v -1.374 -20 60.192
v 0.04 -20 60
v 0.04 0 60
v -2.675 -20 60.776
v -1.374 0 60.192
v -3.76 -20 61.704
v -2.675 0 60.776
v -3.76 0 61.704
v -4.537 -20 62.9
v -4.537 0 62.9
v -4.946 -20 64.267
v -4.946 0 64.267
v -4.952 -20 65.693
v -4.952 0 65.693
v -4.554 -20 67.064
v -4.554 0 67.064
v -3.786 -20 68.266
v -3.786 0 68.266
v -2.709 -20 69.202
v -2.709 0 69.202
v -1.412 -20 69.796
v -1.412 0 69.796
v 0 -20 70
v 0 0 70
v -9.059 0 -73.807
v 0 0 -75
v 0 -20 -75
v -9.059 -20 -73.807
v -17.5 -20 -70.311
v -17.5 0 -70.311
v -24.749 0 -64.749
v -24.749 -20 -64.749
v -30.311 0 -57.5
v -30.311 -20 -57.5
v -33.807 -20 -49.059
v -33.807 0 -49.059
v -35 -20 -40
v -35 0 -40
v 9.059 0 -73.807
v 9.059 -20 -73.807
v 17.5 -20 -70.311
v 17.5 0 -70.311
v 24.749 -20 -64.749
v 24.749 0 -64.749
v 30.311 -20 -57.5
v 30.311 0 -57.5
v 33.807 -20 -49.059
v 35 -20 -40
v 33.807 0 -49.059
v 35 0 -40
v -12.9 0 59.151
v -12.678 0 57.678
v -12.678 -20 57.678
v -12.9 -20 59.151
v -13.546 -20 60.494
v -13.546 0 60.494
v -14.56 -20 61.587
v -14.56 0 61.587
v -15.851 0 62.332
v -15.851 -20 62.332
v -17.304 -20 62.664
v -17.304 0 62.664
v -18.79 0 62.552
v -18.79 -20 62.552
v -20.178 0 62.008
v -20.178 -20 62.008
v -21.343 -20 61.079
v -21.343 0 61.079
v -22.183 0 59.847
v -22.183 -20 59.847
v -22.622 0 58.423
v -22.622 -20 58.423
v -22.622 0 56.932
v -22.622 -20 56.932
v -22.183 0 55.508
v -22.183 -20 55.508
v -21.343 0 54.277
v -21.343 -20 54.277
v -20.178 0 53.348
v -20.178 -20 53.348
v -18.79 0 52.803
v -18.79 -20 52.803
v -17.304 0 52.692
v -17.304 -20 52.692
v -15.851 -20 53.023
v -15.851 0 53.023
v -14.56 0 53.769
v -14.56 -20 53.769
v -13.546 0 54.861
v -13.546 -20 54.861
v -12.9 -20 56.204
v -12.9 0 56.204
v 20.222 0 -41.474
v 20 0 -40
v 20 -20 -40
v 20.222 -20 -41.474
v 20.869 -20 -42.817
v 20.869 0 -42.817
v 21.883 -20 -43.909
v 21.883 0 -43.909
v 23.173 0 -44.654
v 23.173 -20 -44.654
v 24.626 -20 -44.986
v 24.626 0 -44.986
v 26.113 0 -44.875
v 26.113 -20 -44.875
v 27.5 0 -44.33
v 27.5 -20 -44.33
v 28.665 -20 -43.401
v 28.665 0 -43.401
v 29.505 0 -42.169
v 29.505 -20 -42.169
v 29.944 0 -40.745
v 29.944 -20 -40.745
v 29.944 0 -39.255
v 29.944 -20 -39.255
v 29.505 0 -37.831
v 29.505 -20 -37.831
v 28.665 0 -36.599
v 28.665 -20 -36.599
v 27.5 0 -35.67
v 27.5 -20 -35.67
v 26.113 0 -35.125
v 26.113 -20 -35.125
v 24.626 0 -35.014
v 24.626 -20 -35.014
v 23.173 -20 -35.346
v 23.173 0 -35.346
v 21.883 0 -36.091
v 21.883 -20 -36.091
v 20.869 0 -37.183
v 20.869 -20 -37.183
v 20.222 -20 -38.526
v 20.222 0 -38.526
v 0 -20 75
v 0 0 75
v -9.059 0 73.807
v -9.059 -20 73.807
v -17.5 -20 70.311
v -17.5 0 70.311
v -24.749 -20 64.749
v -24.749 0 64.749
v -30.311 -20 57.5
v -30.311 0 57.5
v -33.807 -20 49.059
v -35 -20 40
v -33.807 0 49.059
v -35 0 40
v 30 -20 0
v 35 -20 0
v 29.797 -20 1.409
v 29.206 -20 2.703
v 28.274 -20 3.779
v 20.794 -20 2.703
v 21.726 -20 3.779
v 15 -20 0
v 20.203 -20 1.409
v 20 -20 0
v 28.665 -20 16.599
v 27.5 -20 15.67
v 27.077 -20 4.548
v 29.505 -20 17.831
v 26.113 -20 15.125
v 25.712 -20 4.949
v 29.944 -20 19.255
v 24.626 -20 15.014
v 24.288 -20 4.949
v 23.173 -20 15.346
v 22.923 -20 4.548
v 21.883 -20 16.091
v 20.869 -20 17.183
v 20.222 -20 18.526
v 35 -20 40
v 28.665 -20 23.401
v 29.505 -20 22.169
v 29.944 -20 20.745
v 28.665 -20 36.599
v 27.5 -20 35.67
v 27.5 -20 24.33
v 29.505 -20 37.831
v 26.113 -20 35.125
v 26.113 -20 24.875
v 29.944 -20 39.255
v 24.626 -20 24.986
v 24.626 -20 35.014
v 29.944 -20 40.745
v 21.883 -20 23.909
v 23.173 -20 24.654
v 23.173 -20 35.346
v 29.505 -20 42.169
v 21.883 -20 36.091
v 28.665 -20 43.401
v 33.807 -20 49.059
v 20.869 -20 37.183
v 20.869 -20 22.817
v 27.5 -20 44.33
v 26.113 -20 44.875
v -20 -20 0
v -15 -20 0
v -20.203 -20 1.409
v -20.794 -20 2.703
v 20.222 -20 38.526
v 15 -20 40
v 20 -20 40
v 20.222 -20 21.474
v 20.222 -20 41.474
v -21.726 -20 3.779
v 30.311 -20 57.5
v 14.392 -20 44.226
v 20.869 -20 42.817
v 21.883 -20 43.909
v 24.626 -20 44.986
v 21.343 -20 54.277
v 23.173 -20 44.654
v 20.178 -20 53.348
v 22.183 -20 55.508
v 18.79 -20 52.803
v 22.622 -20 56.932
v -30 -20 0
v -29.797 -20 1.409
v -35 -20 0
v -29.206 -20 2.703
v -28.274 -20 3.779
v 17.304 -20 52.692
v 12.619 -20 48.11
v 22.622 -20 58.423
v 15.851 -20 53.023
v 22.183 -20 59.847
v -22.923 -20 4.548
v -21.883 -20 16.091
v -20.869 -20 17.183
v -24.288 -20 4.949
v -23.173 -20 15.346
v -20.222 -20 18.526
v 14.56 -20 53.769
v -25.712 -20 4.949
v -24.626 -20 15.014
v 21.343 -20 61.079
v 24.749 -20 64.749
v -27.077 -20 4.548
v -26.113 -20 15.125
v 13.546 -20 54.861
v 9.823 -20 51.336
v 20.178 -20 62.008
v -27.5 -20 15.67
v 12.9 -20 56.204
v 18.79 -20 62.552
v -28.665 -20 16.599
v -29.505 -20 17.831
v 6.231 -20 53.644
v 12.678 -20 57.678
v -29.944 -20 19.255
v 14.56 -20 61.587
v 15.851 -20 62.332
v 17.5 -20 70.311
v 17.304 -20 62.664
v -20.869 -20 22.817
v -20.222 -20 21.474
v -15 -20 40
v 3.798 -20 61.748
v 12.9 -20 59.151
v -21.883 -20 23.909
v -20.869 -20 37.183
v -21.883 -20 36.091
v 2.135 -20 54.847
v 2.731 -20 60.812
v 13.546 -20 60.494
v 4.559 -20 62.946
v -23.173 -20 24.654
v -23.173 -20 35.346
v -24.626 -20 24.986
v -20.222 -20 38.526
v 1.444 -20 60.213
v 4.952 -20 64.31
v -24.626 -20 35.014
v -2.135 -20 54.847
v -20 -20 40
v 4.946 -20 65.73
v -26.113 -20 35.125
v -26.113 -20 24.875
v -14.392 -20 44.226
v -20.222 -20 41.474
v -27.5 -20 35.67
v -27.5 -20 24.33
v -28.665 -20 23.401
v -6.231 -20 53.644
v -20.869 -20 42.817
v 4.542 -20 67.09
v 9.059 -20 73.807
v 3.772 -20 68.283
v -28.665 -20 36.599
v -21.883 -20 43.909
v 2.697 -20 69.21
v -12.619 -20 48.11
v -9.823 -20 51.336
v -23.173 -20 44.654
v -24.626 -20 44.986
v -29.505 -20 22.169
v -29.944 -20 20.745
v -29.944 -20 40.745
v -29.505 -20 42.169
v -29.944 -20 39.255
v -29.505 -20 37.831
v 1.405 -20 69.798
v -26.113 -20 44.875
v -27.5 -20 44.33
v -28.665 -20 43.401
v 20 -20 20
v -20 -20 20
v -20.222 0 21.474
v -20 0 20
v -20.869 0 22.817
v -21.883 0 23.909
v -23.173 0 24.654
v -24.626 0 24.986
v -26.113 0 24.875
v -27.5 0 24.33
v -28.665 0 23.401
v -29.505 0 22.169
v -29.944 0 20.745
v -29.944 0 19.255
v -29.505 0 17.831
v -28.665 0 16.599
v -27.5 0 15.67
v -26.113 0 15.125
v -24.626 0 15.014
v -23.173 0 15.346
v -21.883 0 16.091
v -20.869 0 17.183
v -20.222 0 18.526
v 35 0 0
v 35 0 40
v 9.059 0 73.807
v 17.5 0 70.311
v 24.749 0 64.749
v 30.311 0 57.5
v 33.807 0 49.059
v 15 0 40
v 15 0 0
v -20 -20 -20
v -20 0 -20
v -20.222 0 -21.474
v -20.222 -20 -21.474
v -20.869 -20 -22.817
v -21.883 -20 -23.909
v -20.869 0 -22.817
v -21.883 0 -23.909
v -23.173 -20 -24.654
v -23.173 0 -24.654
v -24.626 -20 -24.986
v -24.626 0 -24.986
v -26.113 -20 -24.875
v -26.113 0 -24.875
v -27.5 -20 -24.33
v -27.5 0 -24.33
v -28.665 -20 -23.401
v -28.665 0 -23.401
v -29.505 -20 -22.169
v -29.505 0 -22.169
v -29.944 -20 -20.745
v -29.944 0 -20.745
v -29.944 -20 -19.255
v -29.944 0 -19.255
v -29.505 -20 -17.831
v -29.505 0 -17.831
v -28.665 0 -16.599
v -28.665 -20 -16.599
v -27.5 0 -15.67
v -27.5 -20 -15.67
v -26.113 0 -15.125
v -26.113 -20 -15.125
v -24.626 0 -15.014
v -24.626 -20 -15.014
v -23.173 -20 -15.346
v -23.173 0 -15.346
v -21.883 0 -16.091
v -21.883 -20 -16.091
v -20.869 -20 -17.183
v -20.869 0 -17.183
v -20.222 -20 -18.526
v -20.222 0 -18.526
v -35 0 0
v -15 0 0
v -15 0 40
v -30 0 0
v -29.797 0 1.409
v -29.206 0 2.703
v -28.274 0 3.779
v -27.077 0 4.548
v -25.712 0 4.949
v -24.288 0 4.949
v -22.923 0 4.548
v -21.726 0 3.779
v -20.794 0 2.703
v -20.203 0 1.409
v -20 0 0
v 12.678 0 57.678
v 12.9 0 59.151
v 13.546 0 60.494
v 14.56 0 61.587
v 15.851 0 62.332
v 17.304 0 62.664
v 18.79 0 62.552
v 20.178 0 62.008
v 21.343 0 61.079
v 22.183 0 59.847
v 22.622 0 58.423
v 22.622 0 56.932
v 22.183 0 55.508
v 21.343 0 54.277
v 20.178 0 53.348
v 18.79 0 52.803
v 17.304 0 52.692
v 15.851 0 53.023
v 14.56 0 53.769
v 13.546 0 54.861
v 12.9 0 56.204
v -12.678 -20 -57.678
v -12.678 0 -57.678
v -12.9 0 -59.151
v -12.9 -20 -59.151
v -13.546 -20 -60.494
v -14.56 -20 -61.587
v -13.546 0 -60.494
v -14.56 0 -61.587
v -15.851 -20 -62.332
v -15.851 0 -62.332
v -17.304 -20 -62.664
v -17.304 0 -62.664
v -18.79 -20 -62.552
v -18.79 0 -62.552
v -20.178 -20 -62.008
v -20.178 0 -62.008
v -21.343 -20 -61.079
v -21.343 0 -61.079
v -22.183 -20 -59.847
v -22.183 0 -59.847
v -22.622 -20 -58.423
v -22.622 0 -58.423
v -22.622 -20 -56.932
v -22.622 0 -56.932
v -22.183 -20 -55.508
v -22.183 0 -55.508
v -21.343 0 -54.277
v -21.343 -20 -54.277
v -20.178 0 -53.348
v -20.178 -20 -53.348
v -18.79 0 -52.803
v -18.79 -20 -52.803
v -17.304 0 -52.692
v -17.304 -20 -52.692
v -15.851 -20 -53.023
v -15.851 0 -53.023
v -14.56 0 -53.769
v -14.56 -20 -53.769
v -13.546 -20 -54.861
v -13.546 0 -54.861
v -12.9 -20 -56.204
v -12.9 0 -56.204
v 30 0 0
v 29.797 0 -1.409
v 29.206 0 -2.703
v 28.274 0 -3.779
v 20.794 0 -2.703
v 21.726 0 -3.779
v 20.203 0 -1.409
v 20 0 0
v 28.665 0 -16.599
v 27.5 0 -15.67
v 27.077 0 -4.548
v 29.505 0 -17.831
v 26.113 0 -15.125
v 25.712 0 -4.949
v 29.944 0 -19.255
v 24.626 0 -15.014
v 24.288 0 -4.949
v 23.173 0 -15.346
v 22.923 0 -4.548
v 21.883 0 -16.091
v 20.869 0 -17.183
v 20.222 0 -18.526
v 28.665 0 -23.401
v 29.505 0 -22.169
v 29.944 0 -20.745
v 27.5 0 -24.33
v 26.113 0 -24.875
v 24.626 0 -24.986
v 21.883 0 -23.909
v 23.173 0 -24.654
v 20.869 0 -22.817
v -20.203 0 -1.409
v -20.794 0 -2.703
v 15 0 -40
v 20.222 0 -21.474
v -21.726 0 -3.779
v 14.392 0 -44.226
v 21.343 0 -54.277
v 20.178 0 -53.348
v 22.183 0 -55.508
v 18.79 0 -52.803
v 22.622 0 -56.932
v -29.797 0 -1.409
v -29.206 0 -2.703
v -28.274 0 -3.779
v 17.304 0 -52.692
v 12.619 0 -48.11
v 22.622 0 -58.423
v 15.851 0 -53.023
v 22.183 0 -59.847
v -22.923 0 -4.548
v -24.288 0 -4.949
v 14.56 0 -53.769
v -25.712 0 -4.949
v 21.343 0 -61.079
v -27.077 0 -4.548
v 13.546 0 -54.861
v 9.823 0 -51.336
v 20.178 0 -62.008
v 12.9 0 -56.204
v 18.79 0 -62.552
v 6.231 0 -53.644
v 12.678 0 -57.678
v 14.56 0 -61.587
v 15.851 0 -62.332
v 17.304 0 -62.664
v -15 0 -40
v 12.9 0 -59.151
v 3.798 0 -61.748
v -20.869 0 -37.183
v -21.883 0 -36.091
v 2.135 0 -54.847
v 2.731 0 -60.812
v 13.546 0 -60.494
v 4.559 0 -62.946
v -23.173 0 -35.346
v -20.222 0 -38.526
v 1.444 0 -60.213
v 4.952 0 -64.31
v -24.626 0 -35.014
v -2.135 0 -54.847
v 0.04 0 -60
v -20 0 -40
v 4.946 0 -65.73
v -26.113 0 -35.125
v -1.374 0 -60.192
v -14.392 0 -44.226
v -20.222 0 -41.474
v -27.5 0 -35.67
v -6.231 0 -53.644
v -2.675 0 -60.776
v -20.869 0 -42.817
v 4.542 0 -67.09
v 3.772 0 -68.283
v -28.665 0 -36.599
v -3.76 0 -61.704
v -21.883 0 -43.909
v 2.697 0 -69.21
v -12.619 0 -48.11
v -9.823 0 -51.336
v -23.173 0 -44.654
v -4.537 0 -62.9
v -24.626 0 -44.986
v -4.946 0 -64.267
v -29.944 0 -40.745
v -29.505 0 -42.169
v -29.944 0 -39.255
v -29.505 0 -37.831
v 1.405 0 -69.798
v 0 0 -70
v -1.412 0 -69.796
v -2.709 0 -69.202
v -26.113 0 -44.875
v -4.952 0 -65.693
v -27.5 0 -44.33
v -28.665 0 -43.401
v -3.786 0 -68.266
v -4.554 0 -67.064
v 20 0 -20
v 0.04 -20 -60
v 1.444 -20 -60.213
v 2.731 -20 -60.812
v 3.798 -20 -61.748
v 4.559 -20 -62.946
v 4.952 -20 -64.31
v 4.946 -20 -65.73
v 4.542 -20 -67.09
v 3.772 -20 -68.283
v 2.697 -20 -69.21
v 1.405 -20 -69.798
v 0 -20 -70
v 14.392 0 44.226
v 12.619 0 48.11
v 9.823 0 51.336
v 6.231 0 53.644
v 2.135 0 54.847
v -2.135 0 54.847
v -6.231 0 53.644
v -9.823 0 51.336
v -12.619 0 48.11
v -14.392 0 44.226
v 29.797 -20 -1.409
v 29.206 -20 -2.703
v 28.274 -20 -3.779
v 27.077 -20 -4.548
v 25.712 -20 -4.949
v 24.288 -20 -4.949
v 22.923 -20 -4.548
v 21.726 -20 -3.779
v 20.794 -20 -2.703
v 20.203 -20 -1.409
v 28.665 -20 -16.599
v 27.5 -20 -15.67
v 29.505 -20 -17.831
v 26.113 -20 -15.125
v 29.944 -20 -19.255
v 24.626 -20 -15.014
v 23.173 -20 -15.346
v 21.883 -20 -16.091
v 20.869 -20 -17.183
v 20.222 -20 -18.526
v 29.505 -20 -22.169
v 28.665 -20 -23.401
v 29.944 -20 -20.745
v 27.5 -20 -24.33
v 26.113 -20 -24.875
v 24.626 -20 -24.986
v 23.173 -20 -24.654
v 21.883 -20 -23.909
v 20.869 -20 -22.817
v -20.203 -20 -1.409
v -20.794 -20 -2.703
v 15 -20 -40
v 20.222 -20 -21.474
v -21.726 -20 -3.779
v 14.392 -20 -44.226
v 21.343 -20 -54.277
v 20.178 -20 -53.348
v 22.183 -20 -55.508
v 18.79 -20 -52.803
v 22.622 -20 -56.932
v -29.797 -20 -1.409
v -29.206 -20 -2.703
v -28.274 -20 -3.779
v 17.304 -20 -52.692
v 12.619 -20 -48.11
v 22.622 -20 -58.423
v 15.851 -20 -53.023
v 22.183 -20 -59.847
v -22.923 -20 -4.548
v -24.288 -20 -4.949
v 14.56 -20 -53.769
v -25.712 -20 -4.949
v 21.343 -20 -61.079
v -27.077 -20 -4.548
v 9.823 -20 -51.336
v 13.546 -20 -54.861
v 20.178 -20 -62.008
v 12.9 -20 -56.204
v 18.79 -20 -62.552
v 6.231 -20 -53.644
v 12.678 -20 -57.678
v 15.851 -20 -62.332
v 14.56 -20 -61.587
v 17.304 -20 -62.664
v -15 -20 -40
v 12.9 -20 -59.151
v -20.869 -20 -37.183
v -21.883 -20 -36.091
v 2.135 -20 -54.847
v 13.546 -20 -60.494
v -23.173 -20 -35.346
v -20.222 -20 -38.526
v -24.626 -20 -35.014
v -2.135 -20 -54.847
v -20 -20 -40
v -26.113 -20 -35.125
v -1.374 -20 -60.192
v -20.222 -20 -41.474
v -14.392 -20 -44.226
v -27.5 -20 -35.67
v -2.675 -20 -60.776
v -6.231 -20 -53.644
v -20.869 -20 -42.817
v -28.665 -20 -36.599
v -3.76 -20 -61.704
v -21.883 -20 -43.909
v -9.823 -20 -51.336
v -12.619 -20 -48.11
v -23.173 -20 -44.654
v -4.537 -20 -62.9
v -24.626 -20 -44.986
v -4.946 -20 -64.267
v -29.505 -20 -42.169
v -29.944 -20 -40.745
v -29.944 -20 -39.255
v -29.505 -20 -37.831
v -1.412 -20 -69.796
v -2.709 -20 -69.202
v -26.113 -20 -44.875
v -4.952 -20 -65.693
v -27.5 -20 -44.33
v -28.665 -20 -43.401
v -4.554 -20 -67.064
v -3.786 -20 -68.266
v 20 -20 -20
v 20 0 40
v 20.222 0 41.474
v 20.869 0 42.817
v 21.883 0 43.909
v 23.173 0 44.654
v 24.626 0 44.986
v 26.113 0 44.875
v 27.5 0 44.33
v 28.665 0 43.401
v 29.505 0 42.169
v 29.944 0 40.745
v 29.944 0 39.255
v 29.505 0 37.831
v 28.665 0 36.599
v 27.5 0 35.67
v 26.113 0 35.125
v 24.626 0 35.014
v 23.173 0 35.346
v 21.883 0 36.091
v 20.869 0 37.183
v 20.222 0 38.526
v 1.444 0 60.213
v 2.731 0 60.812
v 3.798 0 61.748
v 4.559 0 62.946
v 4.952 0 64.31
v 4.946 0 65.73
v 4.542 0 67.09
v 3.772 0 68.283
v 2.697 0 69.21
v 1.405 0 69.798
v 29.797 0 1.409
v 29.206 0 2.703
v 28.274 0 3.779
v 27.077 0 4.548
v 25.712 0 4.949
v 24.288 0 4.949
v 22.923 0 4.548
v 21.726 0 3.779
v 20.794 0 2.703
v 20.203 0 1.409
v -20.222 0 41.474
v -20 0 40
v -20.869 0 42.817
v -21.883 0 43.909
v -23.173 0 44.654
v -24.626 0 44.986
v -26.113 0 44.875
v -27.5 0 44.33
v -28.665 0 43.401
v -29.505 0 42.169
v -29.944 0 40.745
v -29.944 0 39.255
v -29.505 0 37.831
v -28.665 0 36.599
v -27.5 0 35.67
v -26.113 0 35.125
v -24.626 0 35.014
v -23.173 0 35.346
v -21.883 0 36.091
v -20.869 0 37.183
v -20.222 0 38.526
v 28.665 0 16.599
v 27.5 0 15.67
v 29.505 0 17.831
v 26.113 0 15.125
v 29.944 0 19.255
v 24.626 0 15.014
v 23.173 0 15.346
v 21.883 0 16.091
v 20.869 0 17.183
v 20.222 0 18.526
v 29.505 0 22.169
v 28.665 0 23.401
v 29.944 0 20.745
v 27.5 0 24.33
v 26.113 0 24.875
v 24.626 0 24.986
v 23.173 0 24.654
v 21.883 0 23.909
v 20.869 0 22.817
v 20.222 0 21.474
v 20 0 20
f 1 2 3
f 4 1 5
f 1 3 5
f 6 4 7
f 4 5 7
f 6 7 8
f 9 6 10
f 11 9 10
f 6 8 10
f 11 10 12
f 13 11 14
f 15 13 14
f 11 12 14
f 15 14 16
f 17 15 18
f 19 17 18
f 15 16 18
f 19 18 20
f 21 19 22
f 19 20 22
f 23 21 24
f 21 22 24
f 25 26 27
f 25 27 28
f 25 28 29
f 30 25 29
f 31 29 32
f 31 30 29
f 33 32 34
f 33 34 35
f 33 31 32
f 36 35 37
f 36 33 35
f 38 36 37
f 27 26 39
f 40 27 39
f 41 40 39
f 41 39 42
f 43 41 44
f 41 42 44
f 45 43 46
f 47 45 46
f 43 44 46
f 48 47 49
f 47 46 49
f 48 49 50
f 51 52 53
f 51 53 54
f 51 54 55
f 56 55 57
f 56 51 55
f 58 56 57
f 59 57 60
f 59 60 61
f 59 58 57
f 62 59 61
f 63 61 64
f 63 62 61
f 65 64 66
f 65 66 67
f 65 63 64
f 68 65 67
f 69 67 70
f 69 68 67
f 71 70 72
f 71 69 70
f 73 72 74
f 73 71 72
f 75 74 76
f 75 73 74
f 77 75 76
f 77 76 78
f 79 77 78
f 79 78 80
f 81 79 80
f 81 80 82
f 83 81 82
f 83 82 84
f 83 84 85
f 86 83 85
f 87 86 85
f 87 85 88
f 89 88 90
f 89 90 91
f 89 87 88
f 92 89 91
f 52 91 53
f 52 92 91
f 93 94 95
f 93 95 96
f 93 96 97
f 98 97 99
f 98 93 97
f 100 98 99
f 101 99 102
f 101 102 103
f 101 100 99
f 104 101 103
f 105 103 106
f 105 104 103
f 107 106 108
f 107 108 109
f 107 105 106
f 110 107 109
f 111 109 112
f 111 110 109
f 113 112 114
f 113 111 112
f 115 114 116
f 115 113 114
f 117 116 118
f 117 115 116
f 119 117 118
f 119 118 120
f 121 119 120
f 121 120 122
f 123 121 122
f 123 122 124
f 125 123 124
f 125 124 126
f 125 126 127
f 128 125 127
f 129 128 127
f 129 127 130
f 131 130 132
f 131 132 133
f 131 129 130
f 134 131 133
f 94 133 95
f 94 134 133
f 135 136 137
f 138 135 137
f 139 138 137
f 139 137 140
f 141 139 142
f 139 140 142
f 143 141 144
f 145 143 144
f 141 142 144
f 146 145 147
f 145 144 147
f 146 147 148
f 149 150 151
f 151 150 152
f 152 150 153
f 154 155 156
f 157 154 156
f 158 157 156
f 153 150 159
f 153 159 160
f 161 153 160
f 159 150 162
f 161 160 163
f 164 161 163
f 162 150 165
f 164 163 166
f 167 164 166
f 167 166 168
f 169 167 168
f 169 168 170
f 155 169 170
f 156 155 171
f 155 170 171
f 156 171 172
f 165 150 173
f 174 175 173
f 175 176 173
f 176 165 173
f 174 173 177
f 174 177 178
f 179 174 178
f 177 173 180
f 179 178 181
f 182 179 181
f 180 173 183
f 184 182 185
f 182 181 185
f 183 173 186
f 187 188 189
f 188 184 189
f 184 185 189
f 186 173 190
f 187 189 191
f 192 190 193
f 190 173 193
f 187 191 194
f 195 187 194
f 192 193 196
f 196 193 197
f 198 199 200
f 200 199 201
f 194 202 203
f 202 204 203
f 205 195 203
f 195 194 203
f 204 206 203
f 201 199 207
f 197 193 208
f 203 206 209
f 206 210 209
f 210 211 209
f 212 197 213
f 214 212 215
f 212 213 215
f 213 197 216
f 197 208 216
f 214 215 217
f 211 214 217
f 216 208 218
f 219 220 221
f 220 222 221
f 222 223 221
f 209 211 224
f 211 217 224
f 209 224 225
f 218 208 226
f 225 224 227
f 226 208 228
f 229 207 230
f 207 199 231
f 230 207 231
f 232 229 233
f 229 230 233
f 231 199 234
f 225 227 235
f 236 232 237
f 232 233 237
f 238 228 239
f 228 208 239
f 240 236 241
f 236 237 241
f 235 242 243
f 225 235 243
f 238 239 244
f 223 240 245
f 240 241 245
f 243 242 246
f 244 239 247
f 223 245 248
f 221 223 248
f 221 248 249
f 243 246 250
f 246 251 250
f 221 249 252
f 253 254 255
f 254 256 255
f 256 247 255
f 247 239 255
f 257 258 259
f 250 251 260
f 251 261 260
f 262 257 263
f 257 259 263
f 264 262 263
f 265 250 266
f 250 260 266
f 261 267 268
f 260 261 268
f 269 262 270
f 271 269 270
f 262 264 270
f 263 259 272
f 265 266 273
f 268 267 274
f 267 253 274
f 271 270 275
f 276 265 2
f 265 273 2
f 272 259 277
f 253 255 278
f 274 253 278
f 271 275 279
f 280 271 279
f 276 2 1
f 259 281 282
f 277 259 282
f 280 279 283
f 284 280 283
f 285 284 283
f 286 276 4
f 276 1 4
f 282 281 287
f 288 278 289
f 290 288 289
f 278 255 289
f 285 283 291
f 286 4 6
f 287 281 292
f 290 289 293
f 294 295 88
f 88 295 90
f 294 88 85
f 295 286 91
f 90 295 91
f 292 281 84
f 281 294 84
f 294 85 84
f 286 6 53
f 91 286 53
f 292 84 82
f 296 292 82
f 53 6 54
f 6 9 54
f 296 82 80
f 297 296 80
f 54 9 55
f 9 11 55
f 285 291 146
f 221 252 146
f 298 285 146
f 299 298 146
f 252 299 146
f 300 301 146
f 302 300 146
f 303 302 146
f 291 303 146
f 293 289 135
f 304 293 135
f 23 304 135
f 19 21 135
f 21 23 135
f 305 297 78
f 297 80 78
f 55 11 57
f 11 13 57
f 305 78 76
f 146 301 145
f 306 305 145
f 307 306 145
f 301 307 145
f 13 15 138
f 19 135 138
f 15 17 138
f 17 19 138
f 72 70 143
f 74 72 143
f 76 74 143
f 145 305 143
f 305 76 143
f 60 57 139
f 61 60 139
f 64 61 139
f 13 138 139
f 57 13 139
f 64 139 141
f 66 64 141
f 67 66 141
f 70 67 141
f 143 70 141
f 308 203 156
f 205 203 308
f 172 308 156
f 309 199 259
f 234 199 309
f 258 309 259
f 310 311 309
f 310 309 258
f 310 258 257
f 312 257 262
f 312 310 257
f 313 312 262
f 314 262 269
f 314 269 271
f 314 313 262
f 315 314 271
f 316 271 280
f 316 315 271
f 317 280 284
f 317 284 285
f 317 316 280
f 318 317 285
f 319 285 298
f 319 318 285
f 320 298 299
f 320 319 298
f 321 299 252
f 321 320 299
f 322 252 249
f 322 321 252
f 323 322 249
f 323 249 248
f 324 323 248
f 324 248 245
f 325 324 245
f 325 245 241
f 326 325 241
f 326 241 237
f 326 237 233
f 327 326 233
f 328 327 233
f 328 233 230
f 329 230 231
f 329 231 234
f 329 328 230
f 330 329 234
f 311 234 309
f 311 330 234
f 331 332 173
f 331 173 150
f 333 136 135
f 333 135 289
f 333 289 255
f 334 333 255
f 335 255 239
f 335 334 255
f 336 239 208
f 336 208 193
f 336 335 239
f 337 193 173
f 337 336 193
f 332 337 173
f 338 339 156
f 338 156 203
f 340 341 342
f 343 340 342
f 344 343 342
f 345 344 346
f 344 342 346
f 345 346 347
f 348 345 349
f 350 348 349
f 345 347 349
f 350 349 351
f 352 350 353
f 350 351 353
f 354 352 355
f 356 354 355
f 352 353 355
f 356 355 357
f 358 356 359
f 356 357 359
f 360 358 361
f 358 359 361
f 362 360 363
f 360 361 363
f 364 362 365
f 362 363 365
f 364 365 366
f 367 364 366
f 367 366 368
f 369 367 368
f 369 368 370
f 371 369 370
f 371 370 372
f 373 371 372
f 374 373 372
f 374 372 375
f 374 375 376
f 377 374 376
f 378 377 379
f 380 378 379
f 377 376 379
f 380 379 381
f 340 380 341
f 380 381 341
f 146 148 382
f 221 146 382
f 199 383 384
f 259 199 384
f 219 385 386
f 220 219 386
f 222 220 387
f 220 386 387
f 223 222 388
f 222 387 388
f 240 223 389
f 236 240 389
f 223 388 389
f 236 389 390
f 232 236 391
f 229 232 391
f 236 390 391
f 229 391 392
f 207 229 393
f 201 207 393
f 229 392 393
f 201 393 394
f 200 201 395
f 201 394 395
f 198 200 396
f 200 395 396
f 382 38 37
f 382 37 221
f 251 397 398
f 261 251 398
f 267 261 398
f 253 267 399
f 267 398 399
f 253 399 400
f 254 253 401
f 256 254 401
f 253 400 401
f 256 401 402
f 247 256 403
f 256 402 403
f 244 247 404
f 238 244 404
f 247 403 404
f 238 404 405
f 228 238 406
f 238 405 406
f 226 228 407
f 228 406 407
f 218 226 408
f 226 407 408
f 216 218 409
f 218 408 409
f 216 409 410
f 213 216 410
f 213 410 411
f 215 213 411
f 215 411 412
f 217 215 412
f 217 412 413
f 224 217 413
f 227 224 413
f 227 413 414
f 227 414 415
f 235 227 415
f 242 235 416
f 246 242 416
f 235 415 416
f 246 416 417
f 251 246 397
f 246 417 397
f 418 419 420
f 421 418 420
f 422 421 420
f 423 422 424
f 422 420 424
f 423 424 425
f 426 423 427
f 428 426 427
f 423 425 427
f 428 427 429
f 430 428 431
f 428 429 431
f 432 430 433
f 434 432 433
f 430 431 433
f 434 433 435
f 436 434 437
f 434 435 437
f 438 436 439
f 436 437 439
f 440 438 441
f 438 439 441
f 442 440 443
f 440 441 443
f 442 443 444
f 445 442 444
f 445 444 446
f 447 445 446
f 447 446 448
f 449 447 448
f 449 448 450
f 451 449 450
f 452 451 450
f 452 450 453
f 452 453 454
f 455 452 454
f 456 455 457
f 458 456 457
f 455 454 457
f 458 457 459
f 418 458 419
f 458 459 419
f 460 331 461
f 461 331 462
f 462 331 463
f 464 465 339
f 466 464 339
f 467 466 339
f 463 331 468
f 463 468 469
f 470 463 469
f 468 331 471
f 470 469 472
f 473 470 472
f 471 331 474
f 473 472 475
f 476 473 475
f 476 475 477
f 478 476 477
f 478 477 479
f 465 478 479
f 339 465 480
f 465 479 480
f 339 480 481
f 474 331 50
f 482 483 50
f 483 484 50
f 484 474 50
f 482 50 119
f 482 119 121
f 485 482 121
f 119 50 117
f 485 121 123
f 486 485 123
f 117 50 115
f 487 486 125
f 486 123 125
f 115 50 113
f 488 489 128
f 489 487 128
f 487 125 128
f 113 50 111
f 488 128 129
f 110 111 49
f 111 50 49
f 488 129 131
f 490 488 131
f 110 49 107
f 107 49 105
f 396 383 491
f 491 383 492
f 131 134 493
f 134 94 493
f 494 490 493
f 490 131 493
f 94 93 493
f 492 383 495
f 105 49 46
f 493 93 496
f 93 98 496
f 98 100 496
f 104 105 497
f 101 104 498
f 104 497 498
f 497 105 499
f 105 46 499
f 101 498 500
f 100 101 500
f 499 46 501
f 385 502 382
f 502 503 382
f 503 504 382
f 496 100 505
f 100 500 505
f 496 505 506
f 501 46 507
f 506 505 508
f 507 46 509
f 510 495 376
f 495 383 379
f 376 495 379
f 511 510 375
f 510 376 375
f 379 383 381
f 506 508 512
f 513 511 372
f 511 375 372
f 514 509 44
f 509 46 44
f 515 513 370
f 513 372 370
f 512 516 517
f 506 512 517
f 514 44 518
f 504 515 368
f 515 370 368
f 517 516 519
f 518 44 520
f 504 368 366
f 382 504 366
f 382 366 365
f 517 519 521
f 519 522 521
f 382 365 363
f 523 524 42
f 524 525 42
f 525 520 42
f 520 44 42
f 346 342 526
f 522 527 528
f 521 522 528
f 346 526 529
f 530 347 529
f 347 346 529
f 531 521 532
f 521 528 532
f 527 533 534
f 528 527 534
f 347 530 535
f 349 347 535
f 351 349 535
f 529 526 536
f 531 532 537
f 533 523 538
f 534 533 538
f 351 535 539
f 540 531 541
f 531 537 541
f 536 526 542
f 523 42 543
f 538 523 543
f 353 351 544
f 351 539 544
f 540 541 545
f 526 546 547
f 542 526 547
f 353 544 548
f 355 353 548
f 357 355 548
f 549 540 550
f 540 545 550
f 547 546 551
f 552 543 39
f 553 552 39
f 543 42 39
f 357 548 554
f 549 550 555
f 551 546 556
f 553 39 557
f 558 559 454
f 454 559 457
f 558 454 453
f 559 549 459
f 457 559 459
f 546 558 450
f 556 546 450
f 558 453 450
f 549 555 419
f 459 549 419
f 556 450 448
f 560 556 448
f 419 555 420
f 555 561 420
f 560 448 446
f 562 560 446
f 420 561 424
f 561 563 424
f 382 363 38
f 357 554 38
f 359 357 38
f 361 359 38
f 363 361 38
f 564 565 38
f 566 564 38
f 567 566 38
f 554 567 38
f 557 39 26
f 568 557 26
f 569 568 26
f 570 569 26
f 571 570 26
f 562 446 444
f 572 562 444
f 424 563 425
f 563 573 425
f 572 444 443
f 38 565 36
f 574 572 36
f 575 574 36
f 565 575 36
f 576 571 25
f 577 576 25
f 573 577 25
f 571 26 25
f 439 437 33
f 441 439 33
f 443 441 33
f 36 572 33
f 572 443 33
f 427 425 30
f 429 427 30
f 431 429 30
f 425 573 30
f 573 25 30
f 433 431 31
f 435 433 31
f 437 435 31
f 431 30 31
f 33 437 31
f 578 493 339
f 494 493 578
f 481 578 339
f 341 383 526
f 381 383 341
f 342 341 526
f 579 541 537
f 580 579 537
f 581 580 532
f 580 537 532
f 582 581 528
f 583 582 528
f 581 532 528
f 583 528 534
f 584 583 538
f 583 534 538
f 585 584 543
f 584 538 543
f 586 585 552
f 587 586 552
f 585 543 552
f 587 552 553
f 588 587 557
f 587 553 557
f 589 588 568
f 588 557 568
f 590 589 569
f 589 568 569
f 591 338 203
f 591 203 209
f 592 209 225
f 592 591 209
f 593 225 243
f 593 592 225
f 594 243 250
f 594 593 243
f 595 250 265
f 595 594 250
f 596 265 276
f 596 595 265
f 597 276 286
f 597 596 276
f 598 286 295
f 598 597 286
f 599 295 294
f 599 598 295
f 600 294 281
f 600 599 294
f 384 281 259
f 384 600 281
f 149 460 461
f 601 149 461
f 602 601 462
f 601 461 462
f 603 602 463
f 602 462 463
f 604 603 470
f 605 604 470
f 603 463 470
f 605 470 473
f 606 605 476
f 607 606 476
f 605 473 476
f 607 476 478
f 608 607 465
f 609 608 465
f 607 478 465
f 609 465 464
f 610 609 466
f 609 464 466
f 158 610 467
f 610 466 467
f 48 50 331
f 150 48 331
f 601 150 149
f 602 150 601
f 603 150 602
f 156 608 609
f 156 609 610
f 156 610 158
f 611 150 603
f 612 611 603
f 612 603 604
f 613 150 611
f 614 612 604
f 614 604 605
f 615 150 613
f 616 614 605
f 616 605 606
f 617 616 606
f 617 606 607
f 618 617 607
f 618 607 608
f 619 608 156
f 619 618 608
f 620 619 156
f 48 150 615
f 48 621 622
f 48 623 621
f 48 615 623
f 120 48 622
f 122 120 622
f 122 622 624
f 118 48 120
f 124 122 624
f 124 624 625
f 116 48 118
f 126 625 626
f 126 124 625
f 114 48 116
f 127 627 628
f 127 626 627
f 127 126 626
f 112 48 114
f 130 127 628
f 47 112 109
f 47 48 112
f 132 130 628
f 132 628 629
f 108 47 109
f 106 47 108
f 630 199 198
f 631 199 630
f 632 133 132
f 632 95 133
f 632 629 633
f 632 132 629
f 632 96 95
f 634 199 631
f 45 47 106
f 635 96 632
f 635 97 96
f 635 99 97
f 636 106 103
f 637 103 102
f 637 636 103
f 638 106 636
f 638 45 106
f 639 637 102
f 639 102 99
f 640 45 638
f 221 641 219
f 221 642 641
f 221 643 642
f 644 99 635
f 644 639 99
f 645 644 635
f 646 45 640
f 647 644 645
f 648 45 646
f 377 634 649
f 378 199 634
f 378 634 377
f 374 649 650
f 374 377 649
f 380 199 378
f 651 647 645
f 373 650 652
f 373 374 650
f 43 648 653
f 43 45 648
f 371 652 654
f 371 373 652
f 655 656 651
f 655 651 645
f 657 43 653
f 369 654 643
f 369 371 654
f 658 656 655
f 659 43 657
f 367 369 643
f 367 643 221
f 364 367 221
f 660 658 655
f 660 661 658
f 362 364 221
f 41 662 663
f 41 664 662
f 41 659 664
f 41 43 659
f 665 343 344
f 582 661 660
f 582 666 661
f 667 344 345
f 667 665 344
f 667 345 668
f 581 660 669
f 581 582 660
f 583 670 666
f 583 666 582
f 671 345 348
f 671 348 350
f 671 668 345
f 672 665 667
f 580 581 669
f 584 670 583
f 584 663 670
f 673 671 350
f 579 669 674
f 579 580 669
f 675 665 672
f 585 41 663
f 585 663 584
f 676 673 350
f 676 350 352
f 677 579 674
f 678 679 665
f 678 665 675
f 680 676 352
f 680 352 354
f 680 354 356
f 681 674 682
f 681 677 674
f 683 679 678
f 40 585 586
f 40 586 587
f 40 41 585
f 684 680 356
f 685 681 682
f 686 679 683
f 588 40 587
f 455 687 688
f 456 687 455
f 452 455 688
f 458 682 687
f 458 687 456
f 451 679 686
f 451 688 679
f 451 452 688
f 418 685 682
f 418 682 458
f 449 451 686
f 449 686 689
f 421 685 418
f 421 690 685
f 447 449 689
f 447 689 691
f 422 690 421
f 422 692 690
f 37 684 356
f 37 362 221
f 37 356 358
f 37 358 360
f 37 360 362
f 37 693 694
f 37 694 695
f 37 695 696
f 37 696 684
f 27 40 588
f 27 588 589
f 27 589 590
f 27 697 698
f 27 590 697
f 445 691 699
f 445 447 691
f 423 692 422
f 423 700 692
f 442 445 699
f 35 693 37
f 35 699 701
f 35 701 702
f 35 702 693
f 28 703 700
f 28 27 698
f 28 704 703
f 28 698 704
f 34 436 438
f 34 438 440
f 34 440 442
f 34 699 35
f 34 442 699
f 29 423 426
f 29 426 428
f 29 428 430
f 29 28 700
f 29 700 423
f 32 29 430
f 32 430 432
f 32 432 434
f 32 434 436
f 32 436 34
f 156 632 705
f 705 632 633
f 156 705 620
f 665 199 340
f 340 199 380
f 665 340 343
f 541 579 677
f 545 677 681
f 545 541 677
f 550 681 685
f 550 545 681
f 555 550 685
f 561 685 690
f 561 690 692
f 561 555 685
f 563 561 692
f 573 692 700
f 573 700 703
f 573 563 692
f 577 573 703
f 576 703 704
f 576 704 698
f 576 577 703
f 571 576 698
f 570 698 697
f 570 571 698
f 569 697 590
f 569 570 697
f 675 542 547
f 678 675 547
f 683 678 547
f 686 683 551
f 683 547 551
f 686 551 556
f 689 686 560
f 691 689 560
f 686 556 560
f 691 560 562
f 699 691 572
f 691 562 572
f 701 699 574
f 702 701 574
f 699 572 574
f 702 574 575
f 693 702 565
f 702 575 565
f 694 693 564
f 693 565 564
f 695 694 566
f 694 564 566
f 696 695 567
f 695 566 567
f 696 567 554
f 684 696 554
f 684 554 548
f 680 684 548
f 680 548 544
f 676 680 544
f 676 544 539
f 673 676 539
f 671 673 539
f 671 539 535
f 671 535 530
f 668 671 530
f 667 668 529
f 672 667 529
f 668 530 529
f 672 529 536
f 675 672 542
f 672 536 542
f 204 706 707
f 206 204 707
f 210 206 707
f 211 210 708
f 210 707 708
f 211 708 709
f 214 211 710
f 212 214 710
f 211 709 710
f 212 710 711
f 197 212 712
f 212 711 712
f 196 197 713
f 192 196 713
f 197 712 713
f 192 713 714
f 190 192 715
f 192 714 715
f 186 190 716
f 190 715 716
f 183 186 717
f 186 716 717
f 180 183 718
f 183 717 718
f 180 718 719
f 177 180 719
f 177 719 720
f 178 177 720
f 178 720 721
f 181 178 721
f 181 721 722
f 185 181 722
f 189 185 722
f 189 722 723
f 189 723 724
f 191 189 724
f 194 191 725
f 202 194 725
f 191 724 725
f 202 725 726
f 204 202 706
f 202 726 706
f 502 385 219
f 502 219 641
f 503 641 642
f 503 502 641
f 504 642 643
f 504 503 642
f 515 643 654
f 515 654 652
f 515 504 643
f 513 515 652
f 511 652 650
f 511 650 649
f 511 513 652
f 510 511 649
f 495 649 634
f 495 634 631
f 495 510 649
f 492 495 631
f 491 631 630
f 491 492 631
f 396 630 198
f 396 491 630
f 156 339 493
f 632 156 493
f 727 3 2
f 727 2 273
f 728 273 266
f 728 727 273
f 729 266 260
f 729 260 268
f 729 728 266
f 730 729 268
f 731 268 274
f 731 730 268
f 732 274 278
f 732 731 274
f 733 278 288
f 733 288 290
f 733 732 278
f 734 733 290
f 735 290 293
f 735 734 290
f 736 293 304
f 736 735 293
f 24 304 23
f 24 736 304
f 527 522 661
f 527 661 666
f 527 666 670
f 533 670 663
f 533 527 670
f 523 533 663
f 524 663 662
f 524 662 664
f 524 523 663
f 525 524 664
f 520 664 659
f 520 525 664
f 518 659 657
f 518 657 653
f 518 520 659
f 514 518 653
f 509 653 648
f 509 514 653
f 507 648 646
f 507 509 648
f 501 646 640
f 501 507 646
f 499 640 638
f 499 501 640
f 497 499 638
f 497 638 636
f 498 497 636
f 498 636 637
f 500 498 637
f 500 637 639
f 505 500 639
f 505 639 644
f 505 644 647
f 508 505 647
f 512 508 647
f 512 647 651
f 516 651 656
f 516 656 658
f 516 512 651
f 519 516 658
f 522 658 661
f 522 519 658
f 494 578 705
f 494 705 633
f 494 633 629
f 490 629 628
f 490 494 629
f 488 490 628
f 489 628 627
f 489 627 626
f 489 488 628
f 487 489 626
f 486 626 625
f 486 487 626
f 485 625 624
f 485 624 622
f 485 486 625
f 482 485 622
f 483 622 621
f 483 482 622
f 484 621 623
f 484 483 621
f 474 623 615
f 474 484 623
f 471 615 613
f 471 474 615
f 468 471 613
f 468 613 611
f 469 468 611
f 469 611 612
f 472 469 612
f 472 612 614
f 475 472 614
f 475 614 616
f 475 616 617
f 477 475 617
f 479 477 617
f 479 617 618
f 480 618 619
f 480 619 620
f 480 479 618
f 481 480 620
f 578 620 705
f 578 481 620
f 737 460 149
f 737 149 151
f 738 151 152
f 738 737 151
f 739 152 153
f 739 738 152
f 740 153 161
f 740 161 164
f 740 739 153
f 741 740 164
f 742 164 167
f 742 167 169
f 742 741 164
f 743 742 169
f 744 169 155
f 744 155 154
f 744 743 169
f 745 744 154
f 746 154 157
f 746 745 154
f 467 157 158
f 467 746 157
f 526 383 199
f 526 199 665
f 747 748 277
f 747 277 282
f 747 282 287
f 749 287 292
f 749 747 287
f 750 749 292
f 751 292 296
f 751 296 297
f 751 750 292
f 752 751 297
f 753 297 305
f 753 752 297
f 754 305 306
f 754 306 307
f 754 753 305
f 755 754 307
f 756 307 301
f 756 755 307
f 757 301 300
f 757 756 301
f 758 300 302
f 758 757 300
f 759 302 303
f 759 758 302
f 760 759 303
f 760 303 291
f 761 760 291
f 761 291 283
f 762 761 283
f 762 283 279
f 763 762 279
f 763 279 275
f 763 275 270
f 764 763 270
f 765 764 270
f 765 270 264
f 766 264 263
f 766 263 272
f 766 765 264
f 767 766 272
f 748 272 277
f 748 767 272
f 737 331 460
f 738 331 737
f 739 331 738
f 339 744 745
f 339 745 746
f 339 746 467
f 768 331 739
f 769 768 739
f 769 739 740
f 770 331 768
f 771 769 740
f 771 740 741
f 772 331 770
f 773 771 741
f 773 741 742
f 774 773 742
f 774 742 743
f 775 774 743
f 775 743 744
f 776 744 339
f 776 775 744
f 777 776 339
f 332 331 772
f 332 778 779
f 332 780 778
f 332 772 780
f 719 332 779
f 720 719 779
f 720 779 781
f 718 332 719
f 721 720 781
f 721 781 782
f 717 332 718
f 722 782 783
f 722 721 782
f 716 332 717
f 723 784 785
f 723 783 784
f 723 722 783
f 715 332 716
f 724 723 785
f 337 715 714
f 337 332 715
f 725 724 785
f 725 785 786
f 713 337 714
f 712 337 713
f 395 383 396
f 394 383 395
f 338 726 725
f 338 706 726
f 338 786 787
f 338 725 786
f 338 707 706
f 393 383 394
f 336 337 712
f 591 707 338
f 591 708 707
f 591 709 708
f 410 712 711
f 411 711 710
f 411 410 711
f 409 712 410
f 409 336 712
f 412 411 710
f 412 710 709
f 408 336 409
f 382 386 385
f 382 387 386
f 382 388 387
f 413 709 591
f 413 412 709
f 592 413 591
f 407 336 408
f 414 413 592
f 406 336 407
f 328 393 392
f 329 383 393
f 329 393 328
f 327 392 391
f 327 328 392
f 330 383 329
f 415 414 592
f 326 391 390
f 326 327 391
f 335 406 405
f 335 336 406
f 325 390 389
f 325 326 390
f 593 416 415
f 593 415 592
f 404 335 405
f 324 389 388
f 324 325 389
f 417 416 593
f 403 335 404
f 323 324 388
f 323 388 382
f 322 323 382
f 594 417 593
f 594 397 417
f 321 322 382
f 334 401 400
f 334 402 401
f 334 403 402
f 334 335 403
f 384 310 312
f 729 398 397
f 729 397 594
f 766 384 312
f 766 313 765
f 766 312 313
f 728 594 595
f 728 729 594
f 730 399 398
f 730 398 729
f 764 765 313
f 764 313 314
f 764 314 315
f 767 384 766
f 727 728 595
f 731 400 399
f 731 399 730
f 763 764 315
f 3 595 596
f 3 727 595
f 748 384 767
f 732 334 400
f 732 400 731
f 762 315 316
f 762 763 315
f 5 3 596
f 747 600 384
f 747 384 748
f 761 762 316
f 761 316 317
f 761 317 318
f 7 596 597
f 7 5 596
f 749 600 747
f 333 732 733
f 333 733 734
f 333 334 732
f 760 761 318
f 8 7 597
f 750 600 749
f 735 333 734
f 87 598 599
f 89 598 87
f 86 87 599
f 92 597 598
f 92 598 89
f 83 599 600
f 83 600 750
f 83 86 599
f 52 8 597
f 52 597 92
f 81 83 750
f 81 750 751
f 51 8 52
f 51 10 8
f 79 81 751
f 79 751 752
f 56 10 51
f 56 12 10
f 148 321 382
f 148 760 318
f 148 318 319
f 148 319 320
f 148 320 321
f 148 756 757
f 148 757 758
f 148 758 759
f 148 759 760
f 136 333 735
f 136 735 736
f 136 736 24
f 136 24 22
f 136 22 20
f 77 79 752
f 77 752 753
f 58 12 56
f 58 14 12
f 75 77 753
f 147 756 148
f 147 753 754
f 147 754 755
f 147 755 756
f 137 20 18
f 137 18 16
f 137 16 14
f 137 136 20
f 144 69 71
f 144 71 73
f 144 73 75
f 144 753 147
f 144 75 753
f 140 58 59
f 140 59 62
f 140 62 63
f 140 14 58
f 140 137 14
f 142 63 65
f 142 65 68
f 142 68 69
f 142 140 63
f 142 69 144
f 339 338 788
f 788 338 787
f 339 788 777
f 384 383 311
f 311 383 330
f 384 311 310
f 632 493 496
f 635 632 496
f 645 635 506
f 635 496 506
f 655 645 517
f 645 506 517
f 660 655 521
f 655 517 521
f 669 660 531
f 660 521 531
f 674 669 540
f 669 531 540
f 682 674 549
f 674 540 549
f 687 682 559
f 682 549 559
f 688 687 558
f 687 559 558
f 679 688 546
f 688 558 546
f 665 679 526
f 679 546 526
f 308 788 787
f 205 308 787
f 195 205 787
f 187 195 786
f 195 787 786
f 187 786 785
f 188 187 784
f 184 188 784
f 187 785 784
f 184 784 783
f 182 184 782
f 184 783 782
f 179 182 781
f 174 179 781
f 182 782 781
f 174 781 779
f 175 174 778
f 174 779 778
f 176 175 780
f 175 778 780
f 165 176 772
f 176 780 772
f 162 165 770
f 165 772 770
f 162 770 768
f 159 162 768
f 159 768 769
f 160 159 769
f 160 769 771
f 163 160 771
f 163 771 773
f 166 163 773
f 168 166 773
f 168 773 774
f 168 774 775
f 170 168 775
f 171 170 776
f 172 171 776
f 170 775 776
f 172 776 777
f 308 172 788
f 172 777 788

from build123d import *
from build123d import SkipClean  # not in build123d's __all__

# Parameters (mm, degrees)
F0_R     = 5
F1_DEPTH = 20


with BuildPart() as f1:
    # F0 (on Front) → F1 (new body)
    with BuildSketch(Plane.XZ):
        with BuildLine():
            ThreePointArc((-15, 40), (-10.6066017178, 50.6066017178), (0, 55))
            Line((0, 55), (0.0401919294, 60.0001615417))
            ThreePointArc((0.0401919294, 60.0001615417), (-4.9999596144, 64.979903873), (0, 70))
            Line((0, 70), (0, 75))
            ThreePointArc((0, 75), (-24.7487373415, 64.7487373415), (-35, 40))
            Line((-35, 40), (-35, 0))
            Line((-35, 0), (-30, 0))
            ThreePointArc((-30, 0), (-25, 5), (-20, 0))
            Line((-20, 0), (-15, 0))
            Line((-15, 0), (-15, 40))
        make_face()
        with Locations((-25, 20)):
            Circle(F0_R, mode=Mode.SUBTRACT)
        with Locations((-25, 40)):
            Circle(F0_R, mode=Mode.SUBTRACT)
        with Locations((-17.6776695297, 57.6776695297)):
            Circle(F0_R, mode=Mode.SUBTRACT)
    extrude(amount=F1_DEPTH)

    # F2: F1 across plane


with BuildPart() as f1_1:
    add(f1.part, clean=False)
    add(f1.part.mirror(Plane.YZ), clean=False)

    # F3: F1 across plane


with BuildPart() as f1_2:
    add(f1_1.part, clean=False)
    with SkipClean():  # cleaning this boolean's faces spoils the solid; the shape is the same uncleaned
        add(f1_1.part.mirror(Plane.XY), clean=False)


solid = f1_2.part
